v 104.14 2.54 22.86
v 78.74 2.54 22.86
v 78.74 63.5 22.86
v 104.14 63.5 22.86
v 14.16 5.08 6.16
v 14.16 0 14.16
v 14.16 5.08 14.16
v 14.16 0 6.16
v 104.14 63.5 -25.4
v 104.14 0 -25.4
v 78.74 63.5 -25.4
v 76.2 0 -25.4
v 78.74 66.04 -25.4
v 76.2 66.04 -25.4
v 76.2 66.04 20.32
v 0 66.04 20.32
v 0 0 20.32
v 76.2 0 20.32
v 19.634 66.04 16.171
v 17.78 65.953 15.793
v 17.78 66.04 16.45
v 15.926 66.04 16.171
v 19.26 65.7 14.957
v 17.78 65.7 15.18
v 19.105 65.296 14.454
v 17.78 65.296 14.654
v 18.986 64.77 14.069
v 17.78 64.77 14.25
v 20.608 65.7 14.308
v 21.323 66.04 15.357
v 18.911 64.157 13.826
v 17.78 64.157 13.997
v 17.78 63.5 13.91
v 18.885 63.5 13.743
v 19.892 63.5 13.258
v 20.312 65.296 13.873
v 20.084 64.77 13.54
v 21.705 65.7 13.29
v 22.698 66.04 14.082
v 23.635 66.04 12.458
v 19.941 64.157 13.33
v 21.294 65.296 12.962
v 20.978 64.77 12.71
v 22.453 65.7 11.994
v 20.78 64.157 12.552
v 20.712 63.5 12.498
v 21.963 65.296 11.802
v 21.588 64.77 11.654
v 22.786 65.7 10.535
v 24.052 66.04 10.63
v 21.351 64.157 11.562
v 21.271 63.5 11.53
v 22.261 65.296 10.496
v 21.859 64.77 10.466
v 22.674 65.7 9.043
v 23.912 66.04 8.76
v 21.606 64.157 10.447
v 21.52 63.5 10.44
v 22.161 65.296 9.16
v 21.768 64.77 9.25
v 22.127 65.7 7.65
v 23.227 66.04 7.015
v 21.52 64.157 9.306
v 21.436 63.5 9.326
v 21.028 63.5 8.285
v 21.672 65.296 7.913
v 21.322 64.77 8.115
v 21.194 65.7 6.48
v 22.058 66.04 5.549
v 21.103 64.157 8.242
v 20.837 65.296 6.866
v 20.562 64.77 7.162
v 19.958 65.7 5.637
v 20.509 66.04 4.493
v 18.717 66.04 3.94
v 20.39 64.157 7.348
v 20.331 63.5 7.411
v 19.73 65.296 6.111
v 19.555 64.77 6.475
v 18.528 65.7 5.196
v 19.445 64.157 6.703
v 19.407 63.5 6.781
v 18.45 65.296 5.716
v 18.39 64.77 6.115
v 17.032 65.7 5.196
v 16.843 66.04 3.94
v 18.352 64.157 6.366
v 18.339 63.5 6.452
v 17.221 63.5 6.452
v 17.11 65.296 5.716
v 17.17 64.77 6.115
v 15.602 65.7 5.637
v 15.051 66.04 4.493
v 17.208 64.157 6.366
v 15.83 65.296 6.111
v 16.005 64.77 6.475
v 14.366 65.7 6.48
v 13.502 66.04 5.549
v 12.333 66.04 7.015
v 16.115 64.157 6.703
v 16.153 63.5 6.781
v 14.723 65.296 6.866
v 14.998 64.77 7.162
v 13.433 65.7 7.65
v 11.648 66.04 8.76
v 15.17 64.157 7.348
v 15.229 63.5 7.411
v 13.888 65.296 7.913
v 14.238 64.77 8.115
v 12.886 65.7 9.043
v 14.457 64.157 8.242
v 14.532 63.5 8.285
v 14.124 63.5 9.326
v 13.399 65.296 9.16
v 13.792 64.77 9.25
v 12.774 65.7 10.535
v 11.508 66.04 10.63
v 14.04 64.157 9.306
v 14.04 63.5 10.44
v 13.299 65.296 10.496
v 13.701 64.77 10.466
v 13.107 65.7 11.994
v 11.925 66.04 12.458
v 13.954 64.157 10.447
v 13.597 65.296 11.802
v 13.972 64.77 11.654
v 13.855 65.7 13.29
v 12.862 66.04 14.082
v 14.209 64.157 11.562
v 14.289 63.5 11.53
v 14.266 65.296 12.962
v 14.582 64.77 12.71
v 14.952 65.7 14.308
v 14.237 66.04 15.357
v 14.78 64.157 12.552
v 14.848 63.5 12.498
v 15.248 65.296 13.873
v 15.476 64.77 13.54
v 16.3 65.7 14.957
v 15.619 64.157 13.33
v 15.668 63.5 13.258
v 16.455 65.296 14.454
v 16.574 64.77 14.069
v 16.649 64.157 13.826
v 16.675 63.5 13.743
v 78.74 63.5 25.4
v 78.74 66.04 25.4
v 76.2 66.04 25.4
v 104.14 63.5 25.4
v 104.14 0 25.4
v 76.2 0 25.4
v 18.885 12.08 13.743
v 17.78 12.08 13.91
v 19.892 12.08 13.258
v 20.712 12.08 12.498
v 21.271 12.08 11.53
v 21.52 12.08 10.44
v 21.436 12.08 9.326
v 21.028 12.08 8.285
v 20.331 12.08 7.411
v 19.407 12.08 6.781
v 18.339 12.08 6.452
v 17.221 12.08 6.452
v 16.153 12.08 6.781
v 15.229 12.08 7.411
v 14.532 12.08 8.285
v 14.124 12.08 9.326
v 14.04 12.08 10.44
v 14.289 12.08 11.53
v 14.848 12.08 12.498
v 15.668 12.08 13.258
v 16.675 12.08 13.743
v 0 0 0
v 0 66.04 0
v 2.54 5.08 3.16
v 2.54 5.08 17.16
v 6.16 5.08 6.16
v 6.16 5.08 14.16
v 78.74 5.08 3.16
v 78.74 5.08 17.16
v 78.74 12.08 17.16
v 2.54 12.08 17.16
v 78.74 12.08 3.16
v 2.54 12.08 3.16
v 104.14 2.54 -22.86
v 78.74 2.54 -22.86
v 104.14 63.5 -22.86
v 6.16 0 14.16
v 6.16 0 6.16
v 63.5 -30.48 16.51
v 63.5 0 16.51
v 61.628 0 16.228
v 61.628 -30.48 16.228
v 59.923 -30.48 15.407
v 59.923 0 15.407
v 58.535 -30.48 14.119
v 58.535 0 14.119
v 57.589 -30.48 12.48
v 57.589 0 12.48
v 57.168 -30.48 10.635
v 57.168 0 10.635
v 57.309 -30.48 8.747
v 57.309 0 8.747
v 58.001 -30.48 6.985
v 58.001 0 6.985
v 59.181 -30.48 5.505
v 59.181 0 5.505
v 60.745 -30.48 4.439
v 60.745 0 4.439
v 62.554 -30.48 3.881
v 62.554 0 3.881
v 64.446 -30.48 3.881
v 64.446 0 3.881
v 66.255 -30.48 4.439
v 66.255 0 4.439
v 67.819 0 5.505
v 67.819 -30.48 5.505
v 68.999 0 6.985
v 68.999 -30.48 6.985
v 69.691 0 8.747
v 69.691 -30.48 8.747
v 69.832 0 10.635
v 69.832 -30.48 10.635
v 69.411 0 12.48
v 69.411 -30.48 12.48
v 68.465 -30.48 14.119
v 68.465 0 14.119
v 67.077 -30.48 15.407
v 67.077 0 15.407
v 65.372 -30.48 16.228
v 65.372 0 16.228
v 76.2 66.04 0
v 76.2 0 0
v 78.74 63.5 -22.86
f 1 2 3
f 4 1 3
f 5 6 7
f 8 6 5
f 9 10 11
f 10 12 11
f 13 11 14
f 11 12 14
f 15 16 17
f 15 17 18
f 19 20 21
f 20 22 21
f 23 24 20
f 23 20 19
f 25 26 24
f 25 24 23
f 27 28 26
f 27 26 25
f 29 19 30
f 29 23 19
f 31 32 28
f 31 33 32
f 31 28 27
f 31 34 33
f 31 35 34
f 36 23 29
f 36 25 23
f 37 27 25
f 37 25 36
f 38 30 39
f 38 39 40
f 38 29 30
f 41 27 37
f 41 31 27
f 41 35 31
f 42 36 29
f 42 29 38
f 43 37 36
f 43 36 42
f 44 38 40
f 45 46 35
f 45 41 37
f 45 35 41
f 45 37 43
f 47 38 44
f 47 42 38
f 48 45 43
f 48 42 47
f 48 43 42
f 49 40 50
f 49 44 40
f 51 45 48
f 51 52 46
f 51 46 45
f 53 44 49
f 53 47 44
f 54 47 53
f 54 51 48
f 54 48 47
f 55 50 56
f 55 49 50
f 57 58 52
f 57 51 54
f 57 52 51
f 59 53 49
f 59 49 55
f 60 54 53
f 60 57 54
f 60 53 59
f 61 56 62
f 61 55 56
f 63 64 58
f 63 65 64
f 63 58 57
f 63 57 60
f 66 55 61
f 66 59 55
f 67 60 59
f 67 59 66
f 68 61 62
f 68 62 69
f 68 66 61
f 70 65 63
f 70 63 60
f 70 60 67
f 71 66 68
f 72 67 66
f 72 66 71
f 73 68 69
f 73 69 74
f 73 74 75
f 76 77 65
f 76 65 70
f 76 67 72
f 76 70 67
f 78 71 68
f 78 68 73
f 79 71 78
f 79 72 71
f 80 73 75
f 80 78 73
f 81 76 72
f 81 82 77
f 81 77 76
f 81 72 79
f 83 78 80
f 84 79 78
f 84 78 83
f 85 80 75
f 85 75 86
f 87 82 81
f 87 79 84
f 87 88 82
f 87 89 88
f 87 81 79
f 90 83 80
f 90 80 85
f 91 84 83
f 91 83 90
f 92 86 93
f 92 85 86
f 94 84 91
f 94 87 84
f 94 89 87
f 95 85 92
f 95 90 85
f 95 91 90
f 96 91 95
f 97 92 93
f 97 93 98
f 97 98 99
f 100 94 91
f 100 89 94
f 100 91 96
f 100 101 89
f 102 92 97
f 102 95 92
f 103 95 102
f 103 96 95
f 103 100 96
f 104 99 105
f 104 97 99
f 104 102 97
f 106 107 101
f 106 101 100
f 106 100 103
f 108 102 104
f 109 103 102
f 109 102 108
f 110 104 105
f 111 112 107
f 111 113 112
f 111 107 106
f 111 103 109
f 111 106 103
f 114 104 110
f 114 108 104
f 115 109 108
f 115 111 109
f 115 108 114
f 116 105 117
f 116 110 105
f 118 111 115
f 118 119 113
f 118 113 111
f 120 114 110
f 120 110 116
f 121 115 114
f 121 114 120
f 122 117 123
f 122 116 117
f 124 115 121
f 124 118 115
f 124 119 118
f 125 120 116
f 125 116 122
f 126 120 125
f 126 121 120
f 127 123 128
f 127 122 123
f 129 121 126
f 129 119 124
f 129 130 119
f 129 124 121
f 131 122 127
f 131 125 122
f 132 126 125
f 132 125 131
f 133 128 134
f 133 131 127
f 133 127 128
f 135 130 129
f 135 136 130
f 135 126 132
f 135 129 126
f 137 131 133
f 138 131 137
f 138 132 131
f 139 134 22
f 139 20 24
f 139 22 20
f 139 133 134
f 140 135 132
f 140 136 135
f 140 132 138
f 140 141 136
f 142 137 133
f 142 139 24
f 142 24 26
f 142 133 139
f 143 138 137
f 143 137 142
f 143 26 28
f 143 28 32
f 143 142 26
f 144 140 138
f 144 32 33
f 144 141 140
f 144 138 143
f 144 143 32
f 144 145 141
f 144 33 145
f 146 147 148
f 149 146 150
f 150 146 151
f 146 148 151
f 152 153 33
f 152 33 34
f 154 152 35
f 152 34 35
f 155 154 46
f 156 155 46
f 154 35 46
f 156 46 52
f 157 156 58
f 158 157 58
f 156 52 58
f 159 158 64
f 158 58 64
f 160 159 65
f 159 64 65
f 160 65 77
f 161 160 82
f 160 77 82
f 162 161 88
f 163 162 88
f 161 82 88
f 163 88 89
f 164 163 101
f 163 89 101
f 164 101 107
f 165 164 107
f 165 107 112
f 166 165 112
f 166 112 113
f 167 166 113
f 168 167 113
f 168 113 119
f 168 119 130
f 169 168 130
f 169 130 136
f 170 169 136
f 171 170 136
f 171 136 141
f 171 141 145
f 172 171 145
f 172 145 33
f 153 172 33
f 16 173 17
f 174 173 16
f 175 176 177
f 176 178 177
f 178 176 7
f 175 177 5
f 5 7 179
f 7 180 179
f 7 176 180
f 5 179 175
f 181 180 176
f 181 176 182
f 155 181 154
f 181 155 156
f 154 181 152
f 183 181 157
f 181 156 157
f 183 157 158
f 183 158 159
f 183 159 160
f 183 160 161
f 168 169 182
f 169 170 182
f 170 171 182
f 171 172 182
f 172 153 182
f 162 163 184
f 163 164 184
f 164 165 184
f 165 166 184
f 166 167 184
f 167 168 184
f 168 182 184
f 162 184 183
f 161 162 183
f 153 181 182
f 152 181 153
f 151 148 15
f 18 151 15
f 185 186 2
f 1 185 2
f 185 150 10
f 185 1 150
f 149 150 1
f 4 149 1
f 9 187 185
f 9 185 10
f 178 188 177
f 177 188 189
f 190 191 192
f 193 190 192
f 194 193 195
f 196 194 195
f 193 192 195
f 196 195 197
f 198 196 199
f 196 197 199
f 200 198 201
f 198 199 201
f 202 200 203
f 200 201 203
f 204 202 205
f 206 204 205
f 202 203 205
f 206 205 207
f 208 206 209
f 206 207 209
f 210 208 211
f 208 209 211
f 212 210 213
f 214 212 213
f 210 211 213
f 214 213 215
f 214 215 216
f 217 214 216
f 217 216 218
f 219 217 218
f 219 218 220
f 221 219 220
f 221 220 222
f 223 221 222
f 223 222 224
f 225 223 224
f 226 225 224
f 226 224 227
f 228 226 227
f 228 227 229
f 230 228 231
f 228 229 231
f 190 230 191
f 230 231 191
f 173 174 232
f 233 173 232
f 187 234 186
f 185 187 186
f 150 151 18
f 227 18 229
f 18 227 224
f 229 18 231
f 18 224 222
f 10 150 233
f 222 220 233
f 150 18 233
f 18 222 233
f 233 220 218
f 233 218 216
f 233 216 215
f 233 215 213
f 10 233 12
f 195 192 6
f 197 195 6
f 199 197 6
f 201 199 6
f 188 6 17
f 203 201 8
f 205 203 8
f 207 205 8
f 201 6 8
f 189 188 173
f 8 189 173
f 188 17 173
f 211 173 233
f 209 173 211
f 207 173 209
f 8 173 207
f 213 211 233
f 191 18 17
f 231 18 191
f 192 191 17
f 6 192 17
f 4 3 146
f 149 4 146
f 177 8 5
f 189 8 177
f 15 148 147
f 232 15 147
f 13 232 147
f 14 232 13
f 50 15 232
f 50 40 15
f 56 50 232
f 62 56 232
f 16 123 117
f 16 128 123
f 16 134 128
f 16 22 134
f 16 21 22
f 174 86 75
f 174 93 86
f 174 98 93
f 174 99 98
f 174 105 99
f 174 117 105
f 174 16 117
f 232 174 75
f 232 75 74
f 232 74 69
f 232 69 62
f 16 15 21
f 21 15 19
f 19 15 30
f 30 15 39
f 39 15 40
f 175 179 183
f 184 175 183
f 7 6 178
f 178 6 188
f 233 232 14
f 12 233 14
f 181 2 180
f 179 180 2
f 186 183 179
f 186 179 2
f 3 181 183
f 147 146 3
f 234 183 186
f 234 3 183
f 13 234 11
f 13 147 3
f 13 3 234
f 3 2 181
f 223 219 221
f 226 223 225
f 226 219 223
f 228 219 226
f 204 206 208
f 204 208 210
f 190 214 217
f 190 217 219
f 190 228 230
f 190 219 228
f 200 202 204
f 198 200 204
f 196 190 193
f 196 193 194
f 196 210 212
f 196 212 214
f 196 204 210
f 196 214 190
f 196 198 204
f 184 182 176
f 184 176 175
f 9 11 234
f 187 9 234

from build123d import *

# Parameters (mm, degrees)
SKETCH1_W                      = 76.2
SKETCH1_H                      = 66.04
BOSS_EXTRUDE1_DEPTH            = 20.32
SKETCH2_R                      = 3.749999993
CUT_EXTRUDE1_DEPTH             = 57.15
SKETCH4_W                      = 8
SKETCH4_H                      = 8
CUT_EXTRUDE4_DEPTH             = 5.08
FILLET2_R                      = 2.54
SKETCH5_W                      = 50.8
SKETCH5_H                      = 66.04
BOSS_EXTRUDE2_DEPTH            = 2.54
BOSS_EXTRUDE3_DEPTH            = 25.4
SKETCH3_W                      = 14
SKETCH3_H                      = 7
CUT_EXTRUDE5_DEPTH             = 73.66
CUT_EXTRUDE5_DIRECTION_2_REACH = 29.94
SKETCH7_R                      = 6.35
BOSS_EXTRUDE4_DEPTH            = 30.48


with BuildPart() as part:
    # Sketch1 → Boss-Extrude1 (new body)
    with BuildSketch(Plane.XY):
        with Locations((38.1, 33.02)):
            Rectangle(SKETCH1_W, SKETCH1_H)
    extrude(amount=BOSS_EXTRUDE1_DEPTH)

    # Sketch2 → Cut-Extrude1 (cut)
    with BuildSketch(Plane(origin=(0, 66.04, 0), x_dir=(1, 0, 0), z_dir=(0, 1, 0))):
        with Locations(Location((17.78, -10.16, 0), (0, 0, 270))):  # turned: the seam where the file's is
            Circle(SKETCH2_R)
    extrude(amount=-CUT_EXTRUDE1_DEPTH, mode=Mode.SUBTRACT)

    # Sketch4 → Cut-Extrude4 (cut)
    with BuildSketch(Plane(origin=(0, 0, 0), x_dir=(-1, 0, 0), z_dir=(0, -1, 0))):
        with Locations((-10.16, -10.16)):
            Rectangle(SKETCH4_W, SKETCH4_H)
    extrude(amount=-CUT_EXTRUDE4_DEPTH, mode=Mode.SUBTRACT)

    # Fillet2
    fillet2_edges = [part.edges().sort_by_distance(p)[0] for p in [
        (17.78, 66.04, 6.410000007),
    ]]
    fillet(fillet2_edges, radius=FILLET2_R)

    # Sketch5 → Boss-Extrude2 (add)
    with BuildSketch(Plane(origin=(76.2, 0, 0), x_dir=(0, 0, -1), z_dir=(1, 0, 0))):
        with Locations((0, 33.02)):
            Rectangle(SKETCH5_W, SKETCH5_H)
    extrude(amount=BOSS_EXTRUDE2_DEPTH)

    # Sketch6 → Boss-Extrude3 (add)
    with BuildSketch(Plane(origin=(78.74, 0, 0), x_dir=(0, 0, -1), z_dir=(1, 0, 0))):
        Polygon((-25.4, 0), (-19.631407878, 0), (15.24, 0), (25.4, 0), (25.4, 63.5), (22.86, 63.5), (22.86, 2.54), (-22.86, 2.54), (-22.86, 63.5), (-25.4, 63.5), align=None)
    extrude(amount=BOSS_EXTRUDE3_DEPTH)

    # Sketch3 → Cut-Extrude5 (cut)
    with BuildSketch(Plane(origin=(76.2, 0, 0), x_dir=(0, 0, -1), z_dir=(1, 0, 0))):
        with Locations((-10.16, 8.58)):
            Rectangle(SKETCH3_W, SKETCH3_H)
    extrude(amount=-CUT_EXTRUDE5_DEPTH, mode=Mode.SUBTRACT)

    # Sketch3 → Cut-Extrude5 direction 2 (cut, up to next)
    with BuildSketch(Plane(origin=(76.2, 0, 0), x_dir=(0, 0, -1), z_dir=(1, 0, 0)), mode=Mode.PRIVATE) as cut_extrude5_direction_2_sk1:
        with Locations((-10.16, 8.58)):
            Rectangle(SKETCH3_W, SKETCH3_H)
    cut_extrude5_direction_2_tool1 = extrude(cut_extrude5_direction_2_sk1.sketch, amount=CUT_EXTRUDE5_DIRECTION_2_REACH, mode=Mode.PRIVATE) & part.part
    add(cut_extrude5_direction_2_tool1.solids().sort_by_distance((76.2, 8.58, 10.16))[0], mode=Mode.SUBTRACT)

    # Sketch7 → Boss-Extrude4 (add)
    with BuildSketch(Plane(origin=(0, 0, 0), x_dir=(-1, 0, 0), z_dir=(0, -1, 0))):
        with Locations(Location((-63.5, -10.16, 0), (0, 0, 270))):  # turned: the seam where the file's is
            Circle(SKETCH7_R)
    extrude(amount=BOSS_EXTRUDE4_DEPTH)


solid = part.part
